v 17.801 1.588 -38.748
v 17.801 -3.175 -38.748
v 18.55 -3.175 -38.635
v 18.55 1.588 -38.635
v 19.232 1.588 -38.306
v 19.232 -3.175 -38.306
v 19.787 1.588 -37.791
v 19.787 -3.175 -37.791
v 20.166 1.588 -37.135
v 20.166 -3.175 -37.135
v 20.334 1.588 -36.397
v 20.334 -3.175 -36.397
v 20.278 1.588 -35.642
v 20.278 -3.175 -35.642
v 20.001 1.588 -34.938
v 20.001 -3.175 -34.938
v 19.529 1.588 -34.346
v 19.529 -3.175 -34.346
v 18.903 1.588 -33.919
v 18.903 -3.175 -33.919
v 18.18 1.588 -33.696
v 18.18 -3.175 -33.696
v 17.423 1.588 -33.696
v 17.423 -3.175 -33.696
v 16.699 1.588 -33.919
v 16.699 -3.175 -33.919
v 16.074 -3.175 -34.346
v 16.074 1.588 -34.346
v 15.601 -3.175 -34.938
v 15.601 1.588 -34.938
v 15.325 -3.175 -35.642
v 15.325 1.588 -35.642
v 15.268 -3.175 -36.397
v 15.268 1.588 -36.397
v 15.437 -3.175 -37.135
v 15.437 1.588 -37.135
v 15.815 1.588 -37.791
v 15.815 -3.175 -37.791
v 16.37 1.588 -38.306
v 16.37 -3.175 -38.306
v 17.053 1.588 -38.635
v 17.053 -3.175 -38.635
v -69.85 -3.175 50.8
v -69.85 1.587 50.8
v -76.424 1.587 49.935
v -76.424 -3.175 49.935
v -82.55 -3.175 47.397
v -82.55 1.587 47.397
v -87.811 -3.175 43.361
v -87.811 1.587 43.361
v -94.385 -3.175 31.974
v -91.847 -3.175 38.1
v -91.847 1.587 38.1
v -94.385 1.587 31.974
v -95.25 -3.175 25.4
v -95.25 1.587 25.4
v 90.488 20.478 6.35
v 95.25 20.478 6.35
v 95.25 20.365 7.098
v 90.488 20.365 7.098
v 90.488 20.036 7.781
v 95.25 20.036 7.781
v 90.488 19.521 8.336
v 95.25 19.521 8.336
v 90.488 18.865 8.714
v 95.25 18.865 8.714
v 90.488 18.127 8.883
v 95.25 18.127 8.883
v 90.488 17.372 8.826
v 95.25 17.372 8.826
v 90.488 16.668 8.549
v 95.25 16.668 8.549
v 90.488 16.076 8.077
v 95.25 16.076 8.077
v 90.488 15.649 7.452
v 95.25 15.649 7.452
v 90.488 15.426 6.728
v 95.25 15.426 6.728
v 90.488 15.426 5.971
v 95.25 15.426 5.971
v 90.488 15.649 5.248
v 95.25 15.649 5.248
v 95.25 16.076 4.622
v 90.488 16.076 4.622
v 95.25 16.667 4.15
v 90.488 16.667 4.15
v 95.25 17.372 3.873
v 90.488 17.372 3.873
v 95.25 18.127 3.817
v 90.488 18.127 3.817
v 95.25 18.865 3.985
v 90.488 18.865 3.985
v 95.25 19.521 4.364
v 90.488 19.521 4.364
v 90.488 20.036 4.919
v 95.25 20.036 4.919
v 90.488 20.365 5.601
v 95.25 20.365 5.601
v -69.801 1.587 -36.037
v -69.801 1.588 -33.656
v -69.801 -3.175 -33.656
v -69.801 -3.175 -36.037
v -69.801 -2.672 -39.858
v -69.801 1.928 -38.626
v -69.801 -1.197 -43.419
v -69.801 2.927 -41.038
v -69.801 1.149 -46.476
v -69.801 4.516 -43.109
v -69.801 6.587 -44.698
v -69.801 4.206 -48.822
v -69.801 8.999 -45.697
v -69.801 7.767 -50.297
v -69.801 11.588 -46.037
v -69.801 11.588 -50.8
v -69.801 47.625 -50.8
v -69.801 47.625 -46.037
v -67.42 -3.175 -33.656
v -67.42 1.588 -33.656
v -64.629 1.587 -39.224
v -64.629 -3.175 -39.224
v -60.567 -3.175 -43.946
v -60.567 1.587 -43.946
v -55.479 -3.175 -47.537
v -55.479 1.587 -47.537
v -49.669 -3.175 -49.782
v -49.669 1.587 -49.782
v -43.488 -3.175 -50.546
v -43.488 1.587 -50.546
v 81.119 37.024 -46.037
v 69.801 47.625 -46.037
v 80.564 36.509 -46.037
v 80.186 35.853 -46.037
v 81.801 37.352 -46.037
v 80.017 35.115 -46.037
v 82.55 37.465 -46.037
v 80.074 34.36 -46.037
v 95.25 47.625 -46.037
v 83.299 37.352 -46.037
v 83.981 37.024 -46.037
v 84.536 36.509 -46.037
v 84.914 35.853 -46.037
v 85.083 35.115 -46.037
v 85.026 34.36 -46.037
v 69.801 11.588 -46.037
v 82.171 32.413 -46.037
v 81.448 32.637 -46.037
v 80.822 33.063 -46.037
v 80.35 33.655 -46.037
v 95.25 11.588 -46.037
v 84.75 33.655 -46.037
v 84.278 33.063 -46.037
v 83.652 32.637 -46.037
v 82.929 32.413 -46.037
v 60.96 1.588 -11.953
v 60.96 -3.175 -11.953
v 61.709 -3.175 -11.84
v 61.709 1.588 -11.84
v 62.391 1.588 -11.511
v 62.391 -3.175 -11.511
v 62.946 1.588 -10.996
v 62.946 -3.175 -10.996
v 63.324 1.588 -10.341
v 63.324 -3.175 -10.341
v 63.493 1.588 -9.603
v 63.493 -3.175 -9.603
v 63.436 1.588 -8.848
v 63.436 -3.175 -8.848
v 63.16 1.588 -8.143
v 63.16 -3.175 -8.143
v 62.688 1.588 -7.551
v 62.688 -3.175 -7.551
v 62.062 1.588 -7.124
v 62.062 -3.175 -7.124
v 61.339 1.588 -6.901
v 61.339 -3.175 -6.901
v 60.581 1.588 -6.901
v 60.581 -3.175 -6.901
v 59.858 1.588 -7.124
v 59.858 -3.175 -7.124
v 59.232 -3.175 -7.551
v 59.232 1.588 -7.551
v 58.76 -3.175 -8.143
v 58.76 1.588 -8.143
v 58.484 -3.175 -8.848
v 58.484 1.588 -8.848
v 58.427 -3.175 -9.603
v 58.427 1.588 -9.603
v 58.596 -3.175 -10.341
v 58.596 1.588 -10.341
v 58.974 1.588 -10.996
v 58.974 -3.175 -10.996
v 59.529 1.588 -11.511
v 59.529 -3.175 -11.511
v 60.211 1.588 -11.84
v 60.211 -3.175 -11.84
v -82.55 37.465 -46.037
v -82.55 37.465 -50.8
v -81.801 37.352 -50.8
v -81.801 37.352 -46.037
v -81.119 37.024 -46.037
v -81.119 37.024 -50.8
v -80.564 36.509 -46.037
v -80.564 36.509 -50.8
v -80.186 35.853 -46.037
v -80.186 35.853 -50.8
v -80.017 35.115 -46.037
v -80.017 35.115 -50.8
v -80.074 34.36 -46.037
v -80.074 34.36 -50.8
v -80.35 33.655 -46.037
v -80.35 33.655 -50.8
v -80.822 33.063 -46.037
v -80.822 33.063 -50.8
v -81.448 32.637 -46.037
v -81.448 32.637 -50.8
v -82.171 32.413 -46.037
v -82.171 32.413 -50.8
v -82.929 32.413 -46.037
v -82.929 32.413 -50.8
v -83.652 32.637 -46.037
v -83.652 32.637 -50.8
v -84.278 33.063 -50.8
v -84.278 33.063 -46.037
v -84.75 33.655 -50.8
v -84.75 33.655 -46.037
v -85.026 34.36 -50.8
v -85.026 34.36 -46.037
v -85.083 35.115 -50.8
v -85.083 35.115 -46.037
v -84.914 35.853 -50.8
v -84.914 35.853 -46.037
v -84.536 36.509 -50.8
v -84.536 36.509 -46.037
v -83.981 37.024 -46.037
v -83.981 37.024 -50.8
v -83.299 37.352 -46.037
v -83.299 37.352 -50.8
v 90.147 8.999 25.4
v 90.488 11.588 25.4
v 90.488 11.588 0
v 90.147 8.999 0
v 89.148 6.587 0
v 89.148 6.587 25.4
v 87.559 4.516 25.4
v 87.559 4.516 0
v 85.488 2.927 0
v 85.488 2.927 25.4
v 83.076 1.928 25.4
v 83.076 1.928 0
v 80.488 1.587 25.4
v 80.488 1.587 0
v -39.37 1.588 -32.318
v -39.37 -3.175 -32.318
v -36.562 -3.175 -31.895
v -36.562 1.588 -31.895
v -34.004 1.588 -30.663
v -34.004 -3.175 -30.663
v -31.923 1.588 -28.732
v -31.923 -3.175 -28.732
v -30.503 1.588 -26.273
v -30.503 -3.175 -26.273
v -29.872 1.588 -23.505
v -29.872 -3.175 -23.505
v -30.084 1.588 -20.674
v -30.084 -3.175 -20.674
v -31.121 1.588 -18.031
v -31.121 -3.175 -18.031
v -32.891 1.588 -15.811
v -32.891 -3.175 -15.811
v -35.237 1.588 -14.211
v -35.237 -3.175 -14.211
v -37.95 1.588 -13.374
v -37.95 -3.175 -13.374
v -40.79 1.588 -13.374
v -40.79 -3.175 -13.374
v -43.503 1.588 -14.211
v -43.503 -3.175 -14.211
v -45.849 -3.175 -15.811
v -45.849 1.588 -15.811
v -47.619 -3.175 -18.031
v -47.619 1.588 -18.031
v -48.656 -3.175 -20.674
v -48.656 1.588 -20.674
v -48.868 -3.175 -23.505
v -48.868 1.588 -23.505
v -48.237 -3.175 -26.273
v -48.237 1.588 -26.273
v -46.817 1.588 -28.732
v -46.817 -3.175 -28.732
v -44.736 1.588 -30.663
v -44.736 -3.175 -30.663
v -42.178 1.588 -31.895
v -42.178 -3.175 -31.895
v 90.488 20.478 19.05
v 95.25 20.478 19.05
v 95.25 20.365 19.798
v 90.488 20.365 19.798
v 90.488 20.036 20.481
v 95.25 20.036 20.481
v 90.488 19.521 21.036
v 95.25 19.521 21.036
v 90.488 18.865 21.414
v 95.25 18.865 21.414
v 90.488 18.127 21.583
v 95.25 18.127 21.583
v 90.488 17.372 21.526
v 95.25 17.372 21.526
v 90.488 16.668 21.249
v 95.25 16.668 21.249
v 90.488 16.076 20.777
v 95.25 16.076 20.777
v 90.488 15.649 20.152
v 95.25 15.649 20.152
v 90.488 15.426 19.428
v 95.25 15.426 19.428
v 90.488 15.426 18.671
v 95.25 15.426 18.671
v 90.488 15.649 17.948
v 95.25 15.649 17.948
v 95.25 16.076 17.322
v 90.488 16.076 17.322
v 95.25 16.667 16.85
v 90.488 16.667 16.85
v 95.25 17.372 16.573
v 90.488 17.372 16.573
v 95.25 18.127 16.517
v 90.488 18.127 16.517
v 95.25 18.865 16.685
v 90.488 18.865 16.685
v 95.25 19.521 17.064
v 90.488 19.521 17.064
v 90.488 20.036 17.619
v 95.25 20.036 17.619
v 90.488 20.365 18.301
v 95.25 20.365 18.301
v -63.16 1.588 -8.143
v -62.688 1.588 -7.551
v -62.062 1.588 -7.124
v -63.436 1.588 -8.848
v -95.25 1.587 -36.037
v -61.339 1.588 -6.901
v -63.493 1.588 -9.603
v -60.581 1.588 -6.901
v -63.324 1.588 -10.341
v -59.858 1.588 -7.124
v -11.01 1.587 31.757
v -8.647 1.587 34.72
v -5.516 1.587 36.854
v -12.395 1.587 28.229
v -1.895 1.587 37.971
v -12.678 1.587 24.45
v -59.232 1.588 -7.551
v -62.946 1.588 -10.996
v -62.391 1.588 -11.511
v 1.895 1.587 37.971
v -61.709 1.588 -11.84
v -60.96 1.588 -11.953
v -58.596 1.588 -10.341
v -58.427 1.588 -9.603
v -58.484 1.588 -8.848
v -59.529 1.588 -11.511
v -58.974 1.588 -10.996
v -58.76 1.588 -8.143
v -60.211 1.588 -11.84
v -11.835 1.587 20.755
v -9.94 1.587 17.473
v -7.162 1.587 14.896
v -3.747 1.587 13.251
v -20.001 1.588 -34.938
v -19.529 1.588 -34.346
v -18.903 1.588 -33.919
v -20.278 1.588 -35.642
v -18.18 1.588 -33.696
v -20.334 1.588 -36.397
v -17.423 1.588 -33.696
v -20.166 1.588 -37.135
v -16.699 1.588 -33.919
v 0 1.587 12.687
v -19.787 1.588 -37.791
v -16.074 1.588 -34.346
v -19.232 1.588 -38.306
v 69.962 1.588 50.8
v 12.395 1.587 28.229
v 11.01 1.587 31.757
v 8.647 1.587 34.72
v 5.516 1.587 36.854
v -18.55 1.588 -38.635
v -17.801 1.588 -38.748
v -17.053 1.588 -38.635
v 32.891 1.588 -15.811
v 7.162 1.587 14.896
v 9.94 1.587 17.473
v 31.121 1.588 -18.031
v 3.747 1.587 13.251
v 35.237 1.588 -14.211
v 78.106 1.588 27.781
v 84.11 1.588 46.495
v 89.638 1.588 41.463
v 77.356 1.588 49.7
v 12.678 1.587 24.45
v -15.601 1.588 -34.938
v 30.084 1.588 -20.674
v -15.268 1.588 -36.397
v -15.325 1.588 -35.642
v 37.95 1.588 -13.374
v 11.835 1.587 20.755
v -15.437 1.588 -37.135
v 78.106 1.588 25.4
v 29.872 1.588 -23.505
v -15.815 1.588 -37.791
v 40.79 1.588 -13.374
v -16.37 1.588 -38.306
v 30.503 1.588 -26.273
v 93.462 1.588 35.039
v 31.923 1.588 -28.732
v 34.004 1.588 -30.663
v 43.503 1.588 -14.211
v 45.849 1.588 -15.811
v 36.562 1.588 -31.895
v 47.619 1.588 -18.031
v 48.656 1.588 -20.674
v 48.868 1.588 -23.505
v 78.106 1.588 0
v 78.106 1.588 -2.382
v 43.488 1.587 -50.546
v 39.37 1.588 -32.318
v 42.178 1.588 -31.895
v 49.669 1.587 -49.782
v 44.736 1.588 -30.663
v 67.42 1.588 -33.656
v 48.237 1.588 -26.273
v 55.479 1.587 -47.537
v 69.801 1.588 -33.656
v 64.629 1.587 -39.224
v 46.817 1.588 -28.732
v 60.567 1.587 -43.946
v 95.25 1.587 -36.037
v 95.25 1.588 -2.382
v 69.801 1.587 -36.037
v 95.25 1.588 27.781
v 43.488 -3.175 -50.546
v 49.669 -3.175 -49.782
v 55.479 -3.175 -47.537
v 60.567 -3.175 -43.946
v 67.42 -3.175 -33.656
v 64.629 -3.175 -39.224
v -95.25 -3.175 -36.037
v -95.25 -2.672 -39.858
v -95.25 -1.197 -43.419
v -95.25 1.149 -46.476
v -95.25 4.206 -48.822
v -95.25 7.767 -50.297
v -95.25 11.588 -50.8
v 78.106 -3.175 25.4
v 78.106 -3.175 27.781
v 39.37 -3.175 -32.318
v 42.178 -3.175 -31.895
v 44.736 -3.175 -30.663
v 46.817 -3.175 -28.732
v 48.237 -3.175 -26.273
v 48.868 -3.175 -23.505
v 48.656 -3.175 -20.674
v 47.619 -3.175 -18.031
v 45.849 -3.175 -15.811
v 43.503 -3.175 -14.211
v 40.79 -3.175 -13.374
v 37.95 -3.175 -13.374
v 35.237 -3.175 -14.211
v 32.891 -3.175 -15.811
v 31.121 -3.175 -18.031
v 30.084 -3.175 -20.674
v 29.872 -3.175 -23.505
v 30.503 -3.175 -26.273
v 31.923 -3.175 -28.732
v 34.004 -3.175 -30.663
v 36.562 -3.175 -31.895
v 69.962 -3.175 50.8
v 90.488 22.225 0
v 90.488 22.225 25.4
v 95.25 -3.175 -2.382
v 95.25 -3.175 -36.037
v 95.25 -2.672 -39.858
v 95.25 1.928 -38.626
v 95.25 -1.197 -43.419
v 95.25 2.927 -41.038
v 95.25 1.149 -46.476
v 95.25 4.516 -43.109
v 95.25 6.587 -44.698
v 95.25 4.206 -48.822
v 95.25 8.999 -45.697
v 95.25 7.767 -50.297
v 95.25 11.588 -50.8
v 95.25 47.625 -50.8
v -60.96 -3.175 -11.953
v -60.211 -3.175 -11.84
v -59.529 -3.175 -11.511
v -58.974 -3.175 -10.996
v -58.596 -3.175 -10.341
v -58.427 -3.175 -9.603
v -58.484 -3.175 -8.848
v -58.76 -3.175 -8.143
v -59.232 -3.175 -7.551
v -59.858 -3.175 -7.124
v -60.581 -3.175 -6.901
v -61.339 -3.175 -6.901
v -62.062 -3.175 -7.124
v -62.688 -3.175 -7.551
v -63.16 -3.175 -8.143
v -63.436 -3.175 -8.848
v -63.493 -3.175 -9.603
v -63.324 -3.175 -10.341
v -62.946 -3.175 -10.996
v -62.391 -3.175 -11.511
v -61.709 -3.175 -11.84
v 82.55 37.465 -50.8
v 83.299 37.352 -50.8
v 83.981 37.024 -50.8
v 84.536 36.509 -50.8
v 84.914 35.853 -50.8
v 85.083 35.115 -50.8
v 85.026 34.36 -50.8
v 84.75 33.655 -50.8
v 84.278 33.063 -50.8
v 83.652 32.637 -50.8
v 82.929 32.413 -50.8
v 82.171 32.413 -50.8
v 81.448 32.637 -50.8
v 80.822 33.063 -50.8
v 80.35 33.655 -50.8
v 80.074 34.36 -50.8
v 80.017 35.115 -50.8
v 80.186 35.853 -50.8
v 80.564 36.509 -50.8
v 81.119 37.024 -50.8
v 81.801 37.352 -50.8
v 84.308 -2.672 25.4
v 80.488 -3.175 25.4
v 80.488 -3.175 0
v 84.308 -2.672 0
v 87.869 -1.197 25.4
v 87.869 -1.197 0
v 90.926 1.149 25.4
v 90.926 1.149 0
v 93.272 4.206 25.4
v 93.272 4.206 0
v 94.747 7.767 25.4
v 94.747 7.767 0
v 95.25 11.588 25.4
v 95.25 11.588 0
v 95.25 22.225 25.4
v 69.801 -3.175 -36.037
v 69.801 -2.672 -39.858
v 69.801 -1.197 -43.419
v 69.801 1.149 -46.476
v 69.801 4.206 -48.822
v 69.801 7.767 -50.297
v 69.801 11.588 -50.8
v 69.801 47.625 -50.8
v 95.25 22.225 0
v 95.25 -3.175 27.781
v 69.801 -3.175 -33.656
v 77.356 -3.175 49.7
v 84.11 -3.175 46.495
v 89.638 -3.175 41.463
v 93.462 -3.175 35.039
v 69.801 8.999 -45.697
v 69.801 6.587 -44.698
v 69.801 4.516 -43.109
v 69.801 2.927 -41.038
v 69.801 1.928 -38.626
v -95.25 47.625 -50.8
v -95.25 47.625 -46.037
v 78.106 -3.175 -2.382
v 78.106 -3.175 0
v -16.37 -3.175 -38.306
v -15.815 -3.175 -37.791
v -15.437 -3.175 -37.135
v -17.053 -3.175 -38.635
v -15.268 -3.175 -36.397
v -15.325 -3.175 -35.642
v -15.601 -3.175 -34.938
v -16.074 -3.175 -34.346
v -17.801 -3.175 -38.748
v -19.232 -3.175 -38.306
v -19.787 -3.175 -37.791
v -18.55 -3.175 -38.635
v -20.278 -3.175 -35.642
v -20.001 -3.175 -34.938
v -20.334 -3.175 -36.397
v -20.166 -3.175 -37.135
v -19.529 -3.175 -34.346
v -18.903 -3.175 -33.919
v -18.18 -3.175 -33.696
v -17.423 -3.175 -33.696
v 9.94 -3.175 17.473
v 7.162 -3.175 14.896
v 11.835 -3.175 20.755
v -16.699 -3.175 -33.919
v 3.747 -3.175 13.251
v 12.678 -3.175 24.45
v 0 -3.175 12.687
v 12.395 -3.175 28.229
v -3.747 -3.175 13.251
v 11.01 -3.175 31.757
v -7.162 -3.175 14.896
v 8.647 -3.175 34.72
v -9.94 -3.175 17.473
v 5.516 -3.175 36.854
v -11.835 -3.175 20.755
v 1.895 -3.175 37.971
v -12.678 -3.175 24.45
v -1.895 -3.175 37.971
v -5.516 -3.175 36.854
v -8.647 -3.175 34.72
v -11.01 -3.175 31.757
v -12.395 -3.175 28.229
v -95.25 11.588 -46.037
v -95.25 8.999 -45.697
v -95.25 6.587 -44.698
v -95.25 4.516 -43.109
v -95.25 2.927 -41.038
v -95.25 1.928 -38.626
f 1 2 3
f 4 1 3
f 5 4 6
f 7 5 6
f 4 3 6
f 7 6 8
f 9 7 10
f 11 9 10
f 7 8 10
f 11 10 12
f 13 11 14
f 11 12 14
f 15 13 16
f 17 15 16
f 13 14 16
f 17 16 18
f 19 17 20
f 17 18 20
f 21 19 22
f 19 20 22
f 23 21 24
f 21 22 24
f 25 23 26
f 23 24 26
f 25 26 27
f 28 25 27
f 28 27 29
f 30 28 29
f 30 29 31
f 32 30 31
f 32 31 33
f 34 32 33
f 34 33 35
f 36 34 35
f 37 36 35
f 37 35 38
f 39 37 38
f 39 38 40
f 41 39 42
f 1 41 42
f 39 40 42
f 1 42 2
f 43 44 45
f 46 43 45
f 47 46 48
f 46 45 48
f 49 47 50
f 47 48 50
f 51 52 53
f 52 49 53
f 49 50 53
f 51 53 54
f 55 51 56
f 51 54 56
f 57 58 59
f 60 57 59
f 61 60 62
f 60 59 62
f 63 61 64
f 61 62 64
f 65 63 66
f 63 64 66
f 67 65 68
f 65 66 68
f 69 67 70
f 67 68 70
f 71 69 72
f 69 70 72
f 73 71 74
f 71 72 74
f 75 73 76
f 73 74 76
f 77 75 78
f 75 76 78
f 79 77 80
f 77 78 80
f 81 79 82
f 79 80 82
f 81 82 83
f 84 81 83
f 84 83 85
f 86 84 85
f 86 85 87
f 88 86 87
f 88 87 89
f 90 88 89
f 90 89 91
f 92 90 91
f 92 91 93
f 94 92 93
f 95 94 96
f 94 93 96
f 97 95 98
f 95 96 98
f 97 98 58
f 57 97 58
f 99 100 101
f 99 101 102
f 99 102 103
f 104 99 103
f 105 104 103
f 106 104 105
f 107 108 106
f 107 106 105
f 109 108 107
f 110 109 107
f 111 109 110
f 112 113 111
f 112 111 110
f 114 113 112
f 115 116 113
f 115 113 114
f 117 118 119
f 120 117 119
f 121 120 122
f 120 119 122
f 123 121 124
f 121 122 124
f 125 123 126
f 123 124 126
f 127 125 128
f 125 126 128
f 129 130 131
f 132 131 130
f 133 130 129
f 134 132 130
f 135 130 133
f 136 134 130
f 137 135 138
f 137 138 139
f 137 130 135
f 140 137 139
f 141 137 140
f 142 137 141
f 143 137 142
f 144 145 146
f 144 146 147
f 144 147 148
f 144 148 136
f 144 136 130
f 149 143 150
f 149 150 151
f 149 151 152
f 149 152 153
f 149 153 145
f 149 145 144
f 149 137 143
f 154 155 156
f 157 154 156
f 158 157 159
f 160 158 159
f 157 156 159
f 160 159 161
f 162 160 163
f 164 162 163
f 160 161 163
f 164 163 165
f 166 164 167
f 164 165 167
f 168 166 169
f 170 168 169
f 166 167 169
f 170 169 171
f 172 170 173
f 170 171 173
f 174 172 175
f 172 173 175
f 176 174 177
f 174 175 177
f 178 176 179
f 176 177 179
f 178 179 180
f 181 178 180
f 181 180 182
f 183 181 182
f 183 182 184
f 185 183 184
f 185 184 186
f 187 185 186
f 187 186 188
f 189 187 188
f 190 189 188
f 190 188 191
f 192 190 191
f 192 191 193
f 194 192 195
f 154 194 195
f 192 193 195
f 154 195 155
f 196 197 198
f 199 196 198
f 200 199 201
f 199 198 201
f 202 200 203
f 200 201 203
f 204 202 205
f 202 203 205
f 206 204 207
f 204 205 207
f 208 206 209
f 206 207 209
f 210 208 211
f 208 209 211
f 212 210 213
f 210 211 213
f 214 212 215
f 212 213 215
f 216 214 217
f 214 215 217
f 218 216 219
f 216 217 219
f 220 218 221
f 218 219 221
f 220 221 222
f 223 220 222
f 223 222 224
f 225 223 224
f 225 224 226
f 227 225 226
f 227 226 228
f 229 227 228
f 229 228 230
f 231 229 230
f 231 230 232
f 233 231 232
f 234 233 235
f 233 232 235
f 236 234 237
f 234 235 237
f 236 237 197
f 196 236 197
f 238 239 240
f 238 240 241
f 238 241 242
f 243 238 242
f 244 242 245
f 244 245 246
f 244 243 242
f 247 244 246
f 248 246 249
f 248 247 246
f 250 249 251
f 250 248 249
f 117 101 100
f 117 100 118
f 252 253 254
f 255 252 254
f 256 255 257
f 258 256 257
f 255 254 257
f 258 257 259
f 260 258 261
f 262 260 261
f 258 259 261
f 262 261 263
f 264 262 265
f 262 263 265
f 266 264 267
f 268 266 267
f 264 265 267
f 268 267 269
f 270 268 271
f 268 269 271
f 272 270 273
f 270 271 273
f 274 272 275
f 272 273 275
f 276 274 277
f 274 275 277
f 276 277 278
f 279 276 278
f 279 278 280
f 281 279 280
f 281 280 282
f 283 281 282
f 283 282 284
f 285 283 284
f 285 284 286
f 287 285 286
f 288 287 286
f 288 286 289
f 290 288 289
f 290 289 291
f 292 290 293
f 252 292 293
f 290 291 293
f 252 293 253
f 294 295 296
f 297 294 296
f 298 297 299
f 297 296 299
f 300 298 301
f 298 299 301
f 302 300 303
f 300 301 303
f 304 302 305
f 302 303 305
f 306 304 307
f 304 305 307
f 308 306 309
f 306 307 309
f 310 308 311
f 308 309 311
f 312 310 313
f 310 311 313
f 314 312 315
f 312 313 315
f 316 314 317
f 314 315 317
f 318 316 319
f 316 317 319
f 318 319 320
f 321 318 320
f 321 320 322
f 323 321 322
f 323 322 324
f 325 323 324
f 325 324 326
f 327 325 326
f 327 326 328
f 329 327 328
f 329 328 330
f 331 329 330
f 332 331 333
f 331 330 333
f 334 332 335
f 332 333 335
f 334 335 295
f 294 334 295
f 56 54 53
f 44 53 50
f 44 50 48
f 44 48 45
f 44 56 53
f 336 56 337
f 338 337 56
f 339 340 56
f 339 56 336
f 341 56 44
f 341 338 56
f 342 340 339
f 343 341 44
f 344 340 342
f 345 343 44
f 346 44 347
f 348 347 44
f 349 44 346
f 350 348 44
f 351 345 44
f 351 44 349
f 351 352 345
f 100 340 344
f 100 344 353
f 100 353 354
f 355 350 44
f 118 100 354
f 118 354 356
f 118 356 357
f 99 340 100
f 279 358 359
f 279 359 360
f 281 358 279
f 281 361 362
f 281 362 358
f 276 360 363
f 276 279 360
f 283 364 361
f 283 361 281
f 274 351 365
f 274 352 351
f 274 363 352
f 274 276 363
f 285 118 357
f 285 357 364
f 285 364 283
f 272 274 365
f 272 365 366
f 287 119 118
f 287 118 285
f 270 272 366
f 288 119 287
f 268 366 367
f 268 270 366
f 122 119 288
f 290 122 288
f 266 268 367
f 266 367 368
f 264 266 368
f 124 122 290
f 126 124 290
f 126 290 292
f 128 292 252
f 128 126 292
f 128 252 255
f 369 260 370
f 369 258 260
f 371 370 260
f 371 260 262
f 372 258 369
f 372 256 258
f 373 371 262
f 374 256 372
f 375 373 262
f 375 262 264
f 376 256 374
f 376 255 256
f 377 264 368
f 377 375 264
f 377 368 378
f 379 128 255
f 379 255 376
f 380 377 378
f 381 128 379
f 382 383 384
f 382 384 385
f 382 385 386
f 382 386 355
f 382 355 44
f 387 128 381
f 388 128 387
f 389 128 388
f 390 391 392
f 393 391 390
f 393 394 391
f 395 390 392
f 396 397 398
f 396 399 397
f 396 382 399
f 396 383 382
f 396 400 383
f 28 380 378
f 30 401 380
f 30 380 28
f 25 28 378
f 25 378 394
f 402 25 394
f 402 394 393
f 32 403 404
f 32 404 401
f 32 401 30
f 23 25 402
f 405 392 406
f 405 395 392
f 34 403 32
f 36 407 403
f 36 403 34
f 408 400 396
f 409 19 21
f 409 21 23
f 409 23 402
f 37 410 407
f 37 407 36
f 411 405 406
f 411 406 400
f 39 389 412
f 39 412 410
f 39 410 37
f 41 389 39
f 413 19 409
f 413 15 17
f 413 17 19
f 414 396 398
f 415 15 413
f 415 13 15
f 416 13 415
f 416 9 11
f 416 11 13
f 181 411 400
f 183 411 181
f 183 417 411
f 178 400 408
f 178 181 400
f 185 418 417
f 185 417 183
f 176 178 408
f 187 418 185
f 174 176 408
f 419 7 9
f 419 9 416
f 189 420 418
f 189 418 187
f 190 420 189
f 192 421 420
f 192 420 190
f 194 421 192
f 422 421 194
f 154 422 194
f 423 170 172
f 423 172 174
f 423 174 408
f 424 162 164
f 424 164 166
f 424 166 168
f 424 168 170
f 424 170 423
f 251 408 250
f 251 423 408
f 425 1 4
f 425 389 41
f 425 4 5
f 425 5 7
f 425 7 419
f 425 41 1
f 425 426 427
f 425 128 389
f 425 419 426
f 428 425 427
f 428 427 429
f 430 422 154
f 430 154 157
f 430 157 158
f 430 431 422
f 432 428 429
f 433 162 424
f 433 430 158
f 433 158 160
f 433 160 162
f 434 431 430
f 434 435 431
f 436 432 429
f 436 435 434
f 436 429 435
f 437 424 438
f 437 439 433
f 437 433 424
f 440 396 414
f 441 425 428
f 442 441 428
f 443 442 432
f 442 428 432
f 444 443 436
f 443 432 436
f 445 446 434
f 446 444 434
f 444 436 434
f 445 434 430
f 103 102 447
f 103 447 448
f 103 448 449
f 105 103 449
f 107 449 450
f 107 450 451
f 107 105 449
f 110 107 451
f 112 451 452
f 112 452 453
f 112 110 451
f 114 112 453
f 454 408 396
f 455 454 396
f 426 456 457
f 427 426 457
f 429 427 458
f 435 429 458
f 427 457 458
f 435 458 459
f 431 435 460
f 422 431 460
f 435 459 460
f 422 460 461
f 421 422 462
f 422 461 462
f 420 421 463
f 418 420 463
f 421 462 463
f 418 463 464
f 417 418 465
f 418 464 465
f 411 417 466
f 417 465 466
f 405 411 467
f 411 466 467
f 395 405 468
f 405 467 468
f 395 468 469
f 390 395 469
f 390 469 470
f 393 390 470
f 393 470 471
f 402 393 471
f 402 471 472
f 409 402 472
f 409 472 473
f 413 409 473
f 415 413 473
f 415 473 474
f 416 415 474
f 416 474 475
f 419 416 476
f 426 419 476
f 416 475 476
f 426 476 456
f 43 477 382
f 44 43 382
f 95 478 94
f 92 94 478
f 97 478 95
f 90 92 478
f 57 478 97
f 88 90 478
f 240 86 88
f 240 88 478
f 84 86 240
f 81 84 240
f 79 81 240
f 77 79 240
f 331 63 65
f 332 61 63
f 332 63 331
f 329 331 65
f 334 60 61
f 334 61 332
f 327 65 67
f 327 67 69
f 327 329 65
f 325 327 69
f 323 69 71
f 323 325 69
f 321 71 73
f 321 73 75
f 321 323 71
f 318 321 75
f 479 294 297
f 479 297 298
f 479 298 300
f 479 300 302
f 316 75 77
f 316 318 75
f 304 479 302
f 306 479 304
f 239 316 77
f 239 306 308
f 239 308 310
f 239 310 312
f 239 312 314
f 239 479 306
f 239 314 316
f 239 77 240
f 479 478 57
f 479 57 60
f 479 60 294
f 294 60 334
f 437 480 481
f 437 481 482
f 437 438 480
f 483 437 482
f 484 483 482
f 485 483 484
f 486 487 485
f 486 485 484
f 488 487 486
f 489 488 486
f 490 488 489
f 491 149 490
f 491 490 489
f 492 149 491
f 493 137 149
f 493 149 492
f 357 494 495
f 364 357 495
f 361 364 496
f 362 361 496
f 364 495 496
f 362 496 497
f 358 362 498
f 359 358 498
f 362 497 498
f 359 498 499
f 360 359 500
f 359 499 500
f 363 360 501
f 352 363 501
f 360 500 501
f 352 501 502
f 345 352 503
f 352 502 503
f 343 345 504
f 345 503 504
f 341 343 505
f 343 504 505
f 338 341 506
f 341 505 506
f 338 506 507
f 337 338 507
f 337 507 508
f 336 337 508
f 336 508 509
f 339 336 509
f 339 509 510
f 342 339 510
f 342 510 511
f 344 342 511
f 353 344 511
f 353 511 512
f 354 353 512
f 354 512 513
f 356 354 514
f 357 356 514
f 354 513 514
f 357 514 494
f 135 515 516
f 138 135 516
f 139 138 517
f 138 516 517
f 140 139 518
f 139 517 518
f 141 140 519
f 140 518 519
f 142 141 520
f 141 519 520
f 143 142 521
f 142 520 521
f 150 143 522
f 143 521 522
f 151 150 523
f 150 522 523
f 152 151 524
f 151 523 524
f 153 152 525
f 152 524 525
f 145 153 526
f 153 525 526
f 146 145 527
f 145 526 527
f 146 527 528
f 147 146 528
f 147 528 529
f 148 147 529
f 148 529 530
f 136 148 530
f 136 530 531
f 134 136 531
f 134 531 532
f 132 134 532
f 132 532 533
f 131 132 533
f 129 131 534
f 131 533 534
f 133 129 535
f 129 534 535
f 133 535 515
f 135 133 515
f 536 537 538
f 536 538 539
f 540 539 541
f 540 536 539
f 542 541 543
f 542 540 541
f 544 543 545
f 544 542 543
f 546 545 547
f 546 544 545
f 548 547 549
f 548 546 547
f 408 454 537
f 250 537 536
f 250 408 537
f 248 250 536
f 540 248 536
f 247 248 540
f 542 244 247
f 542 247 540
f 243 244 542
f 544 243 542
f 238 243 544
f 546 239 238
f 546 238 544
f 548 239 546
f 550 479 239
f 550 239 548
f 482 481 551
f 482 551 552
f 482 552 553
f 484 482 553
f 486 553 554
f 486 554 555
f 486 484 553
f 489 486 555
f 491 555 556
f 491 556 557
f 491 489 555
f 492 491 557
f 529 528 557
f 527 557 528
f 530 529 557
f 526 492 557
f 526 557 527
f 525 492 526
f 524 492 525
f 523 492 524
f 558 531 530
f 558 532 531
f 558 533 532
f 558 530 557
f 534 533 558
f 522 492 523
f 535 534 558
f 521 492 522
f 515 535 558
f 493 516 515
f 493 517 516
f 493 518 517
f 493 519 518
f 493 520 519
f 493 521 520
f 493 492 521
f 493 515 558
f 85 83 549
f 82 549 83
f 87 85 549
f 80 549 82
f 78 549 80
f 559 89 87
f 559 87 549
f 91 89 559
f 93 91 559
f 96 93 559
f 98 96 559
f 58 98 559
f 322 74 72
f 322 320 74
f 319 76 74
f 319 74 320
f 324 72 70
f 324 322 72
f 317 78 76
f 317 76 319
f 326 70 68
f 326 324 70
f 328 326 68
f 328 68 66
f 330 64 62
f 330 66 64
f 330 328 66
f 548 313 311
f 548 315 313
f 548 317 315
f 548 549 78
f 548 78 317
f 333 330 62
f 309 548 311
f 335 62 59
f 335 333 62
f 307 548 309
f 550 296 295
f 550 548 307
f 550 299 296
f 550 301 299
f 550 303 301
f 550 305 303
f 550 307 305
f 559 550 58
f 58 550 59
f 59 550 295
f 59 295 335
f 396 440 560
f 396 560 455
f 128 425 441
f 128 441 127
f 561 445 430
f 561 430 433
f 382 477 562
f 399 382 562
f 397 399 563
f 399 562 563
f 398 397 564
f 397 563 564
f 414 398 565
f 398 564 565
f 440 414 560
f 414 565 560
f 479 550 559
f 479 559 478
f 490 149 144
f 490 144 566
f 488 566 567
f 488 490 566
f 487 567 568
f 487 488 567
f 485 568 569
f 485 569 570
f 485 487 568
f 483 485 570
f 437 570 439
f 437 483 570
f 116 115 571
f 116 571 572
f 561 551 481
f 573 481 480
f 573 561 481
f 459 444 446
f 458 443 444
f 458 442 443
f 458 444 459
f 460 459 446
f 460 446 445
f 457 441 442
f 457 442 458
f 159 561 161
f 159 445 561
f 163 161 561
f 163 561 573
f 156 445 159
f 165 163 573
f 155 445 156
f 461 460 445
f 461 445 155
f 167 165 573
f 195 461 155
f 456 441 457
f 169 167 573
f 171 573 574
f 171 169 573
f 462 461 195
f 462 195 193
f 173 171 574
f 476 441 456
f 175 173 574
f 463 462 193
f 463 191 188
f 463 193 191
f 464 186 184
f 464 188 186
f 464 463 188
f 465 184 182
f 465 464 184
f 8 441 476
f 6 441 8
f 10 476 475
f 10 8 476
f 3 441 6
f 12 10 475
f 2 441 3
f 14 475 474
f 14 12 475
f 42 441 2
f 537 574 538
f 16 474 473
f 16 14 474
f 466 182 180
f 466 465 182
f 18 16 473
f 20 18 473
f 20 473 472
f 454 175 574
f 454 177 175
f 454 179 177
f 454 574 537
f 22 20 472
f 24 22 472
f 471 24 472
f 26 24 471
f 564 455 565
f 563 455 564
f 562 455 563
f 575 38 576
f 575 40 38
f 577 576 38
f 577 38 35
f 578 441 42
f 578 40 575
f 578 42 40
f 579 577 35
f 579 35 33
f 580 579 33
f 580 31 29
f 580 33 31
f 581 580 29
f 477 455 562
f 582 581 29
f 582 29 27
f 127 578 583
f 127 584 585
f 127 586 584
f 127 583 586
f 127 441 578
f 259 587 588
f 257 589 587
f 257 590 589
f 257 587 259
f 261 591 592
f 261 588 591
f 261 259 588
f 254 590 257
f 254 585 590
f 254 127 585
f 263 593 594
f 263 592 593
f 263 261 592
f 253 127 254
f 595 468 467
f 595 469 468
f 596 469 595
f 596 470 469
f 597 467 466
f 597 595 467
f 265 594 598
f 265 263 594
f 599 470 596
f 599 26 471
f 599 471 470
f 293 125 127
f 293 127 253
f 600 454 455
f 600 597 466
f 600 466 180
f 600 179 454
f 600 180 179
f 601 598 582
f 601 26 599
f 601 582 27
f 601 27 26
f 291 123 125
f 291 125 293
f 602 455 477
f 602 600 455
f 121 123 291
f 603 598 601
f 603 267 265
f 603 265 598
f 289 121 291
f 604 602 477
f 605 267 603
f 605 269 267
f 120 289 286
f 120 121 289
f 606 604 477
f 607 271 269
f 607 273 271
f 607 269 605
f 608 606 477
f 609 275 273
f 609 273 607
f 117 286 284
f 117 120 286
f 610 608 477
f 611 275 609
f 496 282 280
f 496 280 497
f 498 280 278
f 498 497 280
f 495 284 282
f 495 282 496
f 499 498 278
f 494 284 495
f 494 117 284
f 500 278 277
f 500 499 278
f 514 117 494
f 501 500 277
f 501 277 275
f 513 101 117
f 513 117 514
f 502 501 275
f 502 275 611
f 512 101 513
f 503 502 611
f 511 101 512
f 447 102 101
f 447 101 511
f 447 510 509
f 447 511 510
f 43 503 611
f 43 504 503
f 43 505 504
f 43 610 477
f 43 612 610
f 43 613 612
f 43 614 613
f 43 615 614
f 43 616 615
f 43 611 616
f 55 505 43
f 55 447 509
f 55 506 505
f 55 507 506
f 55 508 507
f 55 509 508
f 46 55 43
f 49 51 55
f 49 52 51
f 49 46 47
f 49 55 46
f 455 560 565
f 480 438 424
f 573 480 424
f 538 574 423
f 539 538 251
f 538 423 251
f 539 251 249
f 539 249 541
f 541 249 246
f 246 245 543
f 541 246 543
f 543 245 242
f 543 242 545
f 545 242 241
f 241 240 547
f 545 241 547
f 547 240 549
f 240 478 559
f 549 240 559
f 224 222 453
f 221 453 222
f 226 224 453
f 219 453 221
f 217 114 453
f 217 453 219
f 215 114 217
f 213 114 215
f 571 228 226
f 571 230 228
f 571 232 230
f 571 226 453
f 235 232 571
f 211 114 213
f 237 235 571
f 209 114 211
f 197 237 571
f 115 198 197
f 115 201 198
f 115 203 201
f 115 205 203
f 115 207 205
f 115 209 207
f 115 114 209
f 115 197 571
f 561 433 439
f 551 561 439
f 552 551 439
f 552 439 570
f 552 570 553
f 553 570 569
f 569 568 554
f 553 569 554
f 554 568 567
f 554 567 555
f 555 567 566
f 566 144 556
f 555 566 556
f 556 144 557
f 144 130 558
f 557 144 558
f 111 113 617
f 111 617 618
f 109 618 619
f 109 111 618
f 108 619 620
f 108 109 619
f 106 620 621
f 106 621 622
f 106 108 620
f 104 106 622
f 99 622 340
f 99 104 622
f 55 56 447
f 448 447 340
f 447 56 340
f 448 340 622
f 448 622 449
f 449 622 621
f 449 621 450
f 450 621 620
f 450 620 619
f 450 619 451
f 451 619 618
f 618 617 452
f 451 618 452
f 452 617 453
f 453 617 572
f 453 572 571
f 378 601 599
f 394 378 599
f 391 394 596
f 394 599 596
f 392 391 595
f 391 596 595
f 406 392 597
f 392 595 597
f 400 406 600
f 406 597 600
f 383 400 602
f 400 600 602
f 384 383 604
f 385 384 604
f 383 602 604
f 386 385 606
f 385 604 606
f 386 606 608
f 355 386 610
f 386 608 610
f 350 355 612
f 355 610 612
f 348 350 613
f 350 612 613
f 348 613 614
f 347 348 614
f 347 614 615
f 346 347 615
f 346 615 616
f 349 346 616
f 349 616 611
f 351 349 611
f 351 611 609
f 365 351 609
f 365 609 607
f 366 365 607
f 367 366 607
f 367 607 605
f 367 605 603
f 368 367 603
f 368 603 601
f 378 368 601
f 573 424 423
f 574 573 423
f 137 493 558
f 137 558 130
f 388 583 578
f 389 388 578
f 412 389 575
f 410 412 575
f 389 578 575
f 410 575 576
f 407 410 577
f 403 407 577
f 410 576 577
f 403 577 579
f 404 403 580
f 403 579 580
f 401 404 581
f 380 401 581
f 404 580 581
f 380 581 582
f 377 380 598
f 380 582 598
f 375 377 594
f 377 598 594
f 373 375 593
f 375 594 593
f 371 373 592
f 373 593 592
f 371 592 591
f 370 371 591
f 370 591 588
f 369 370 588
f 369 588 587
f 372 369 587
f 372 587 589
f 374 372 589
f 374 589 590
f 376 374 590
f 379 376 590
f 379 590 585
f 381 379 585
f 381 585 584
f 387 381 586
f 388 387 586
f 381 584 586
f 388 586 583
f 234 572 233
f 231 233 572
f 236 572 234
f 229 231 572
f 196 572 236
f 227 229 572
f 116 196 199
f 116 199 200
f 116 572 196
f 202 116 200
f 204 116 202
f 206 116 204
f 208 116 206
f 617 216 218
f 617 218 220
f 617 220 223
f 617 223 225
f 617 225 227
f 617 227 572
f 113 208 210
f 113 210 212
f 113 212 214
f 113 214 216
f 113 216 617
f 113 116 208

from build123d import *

# Parameters (mm, degrees)
SKETCH1_W                     = 190.5
SKETCH1_H                     = 101.6
BOSS_EXTRUDE1_DEPTH           = 1.5875
CONVERT_SOLID1_START          = -95.25
CONVERT_SOLID1_OUTLINE_W      = 3.175
CONVERT_SOLID1_OUTLINE_H      = 101.6
CONVERT_SOLID1_DEPTH          = 190.5
SKETCH35_W                    = 139.601875342
SKETCH35_H                    = 6.35
CUT_EXTRUDE7_DEPTH            = 0.254
EDGE_FLANGE1_STRIP_W          = 39.05
EDGE_FLANGE1_STRIP_H          = 4.7625
EDGE_FLANGE1_STRIP_CUT_DEPTH  = 25.449062329
EDGE_FLANGE1_RELIEF_W         = 41.43125
EDGE_FLANGE1_RELIEF_H         = 2.38125
EDGE_FLANGE1_RELIEF_CUT_DEPTH = 4.7625
EDGE_FLANGE1_DEPTH            = 25.449062329
EDGE_FLANGE2_STRIP_W          = 39.05
EDGE_FLANGE2_STRIP_H          = 4.7625
EDGE_FLANGE2_STRIP_CUT_DEPTH  = 25.449062329
EDGE_FLANGE2_RELIEF_W         = 41.43125
EDGE_FLANGE2_RELIEF_H         = 2.38125
EDGE_FLANGE2_RELIEF_CUT_DEPTH = 4.7625
EDGE_FLANGE2_DEPTH            = 25.449062329
SKETCH50_R                    = 12.713493351
CUT_EXTRUDE9_DEPTH            = 5.08
FILLET1_R                     = 25.4
CUT_EXTRUDE11_START           = -4.7625
CUT_EXTRUDE11_OUTLINE_W       = 6.35
CUT_EXTRUDE11_OUTLINE_H       = 0.00254
CUT_EXTRUDE11_OUTLINE_H_2     = 0.000254
CUT_EXTRUDE11_DEPTH           = 4.7625
EDGE_FLANGE3_STRIP_W          = 39.05
EDGE_FLANGE3_STRIP_H          = 4.7625
EDGE_FLANGE3_STRIP_CUT_DEPTH  = 25.4
EDGE_FLANGE3_RELIEF_W         = 41.43125
EDGE_FLANGE3_RELIEF_H         = 2.38125
EDGE_FLANGE3_RELIEF_CUT_DEPTH = 4.7625
EDGE_FLANGE3_DEPTH            = 25.4
SKETCH55_R                    = 2.54
CUT_EXTRUDE12_DEPTH           = 4.7625
FILLET2_R                     = 25.4
SKETCH56_R                    = 2.54
CUT_EXTRUDE13_DEPTH           = 4.7625
SKETCH57_R                    = 9.525
SKETCH57_R_2                  = 2.54
CUT_EXTRUDE14_DEPTH           = 4.7625


# Read off the part's stored shape, not the designer's step: Convert-Solid1, Cut-Extrude11
# Sheet-metal steps are written as plain solids
with BuildPart() as part:
    # Sketch1 → Boss-Extrude1 (new body)
    with BuildSketch(Plane(origin=(0, 0, 0), x_dir=(1, 0, 0), z_dir=(0, 1, 0))):
        Rectangle(SKETCH1_W, SKETCH1_H)
    extrude(amount=BOSS_EXTRUDE1_DEPTH)

    # Convert-Solid1 outline → Convert-Solid1 (add)
    with BuildSketch(Plane.YZ.offset(CONVERT_SOLID1_START)):
        with Locations((-1.5875, 0)):
            Rectangle(CONVERT_SOLID1_OUTLINE_W, CONVERT_SOLID1_OUTLINE_H)
    extrude(amount=CONVERT_SOLID1_DEPTH)

    # Sketch35 → Cut-Extrude7 (cut)
    with BuildSketch(Plane(origin=(0, 0, -50.8), x_dir=(-1, 0, 0), z_dir=(0, 0, -1))):
        Rectangle(SKETCH35_W, SKETCH35_H)
    extrude(amount=-CUT_EXTRUDE7_DEPTH, mode=Mode.SUBTRACT)

    # Edge-Flange1 strip (across the edge) → Edge-Flange1 strip cut (cut)
    with BuildSketch(Plane(origin=(95.25, 1.5875, -50.8), x_dir=(0, 0, 1), z_dir=(-1, 0, 0))):
        with Locations((-4.7625, -2.38125)):
            Rectangle(EDGE_FLANGE1_STRIP_W, EDGE_FLANGE1_STRIP_H)
    extrude(amount=EDGE_FLANGE1_STRIP_CUT_DEPTH, mode=Mode.SUBTRACT)

    # Edge-Flange1 relief (on the sheet) → Edge-Flange1 relief cut (cut)
    with BuildSketch(Plane(origin=(95.25, 1.5875, -36.0375), x_dir=(0, 0, 1), z_dir=(0, 1, 0))):
        with Locations((-18.334375, -26.639687329)):
            Rectangle(EDGE_FLANGE1_RELIEF_W, EDGE_FLANGE1_RELIEF_H)
    extrude(amount=-EDGE_FLANGE1_RELIEF_CUT_DEPTH, mode=Mode.SUBTRACT)

    # Edge-Flange1 section (across the edge) → Edge-Flange1 (add)
    with BuildSketch(Plane(origin=(95.25, 1.5875, -50.8), x_dir=(0, 0, 1), z_dir=(-1, 0, 0))):
        with BuildLine():
            Line((0, 10), (0, 46.0375))
            Line((0, 46.0375), (4.7625, 46.0375))
            Line((4.7625, 46.0375), (4.7625, 10))
            ThreePointArc((4.7625, 10), (7.691432188, 2.928932188), (14.7625, 0))
            Line((14.7625, 0), (14.7625, -4.7625))
            ThreePointArc((14.7625, -4.7625), (4.323836143, -0.438663857), (0, 10))
        make_face()
    extrude(amount=EDGE_FLANGE1_DEPTH)

    # Edge-Flange2 strip (across the edge) → Edge-Flange2 strip cut (cut)
    with BuildSketch(Plane(origin=(-69.800937671, 1.5875, -50.8), x_dir=(0, 0, 1), z_dir=(-1, 0, 0))):
        with Locations((-4.7625, -2.38125)):
            Rectangle(EDGE_FLANGE2_STRIP_W, EDGE_FLANGE2_STRIP_H)
    extrude(amount=EDGE_FLANGE2_STRIP_CUT_DEPTH, mode=Mode.SUBTRACT)

    # Edge-Flange2 relief (on the sheet) → Edge-Flange2 relief cut (cut)
    with BuildSketch(Plane(origin=(-69.800937671, 1.5875, -36.0375), x_dir=(0, 0, 1), z_dir=(0, 1, 0))):
        with Locations((-18.334375, 1.190625)):
            Rectangle(EDGE_FLANGE2_RELIEF_W, EDGE_FLANGE2_RELIEF_H)
    extrude(amount=-EDGE_FLANGE2_RELIEF_CUT_DEPTH, mode=Mode.SUBTRACT)

    # Edge-Flange2 section (across the edge) → Edge-Flange2 (add)
    with BuildSketch(Plane(origin=(-69.800937671, 1.5875, -50.8), x_dir=(0, 0, 1), z_dir=(-1, 0, 0))):
        with BuildLine():
            Line((0, 10), (0, 46.0375))
            Line((0, 46.0375), (4.7625, 46.0375))
            Line((4.7625, 46.0375), (4.7625, 10))
            ThreePointArc((4.7625, 10), (7.691432188, 2.928932188), (14.7625, 0))
            Line((14.7625, 0), (14.7625, -4.7625))
            ThreePointArc((14.7625, -4.7625), (4.323836143, -0.438663857), (0, 10))
        make_face()
    extrude(amount=EDGE_FLANGE2_DEPTH)

    # Sketch50 → Cut-Extrude9 (cut)
    with BuildSketch(Plane(origin=(0, -3.175, 0), x_dir=(-1, 0, 0), z_dir=(0, -1, 0))):
        with Locations(Location((0, -25.4, 0), (0, 0, 90))):
            Circle(SKETCH50_R)
    extrude(amount=-CUT_EXTRUDE9_DEPTH, mode=Mode.SUBTRACT)

    # Fillet1
    # the kernel refuses this fillet: 25.4 mm, written as the material it takes off along each edge
    with BuildSketch(Plane(origin=(-67.419687671, 61.417239936, -50.546), x_dir=(1, 0, 0), z_dir=(0, -1, 0))) as fillet1_piece_1:
        with BuildLine():
            CenterArc((23.931895975, 25.4), FILLET1_R, 199.575530564, 70.424469436)
            Line((0, 16.88975), (-0.478637919, 16.719545))
            ThreePointArc((-0.478637919, 16.719545), (-0.508, 8.444875), (-0.508, 0))
            Line((-0.508, 0), (0, -0.508))
            Line((0, -0.508), (23.931895975, -0.508))
            Line((23.931895975, -0.508), (23.931895975, 0))
        make_face()
    extrude(amount=124.421979873, mode=Mode.SUBTRACT)
    with BuildSketch(Plane(origin=(67.419687671, 61.417239936, -50.546), x_dir=(0, 0, 1), z_dir=(0, -1, 0))) as fillet1_piece_2:
        with BuildLine():
            CenterArc((25.4, 23.931895975), FILLET1_R, 180, 70.424469436)
            Line((0, 23.931895975), (-0.508, 23.931895975))
            Line((-0.508, 23.931895975), (-0.508, 0))
            Line((-0.508, 0), (0, -0.508))
            ThreePointArc((0, -0.508), (8.444875, -0.508), (16.719545, -0.478637919))
            Line((16.719545, -0.478637919), (16.88975, 0))
        make_face()
    extrude(amount=124.421979873, mode=Mode.SUBTRACT)

    # Cut-Extrude11 outline → Cut-Extrude11 (cut)
    with BuildSketch(Plane.XZ.offset(3.175).offset(CUT_EXTRUDE11_START)):
        with Locations((92.075, -0.001524)):
            Rectangle(CUT_EXTRUDE11_OUTLINE_W, CUT_EXTRUDE11_OUTLINE_H)
        with Locations((92.075, 25.399873)):
            Rectangle(CUT_EXTRUDE11_OUTLINE_W, CUT_EXTRUDE11_OUTLINE_H_2)
    extrude(amount=CUT_EXTRUDE11_DEPTH, mode=Mode.SUBTRACT)

    # Edge-Flange3 strip (across the edge) → Edge-Flange3 strip cut (cut)
    with BuildSketch(Plane(origin=(95.25, 1.5875, 25.399746), x_dir=(-1, 0, 0), z_dir=(0, 0, -1))):
        with Locations((-4.7625, -2.38125)):
            Rectangle(EDGE_FLANGE3_STRIP_W, EDGE_FLANGE3_STRIP_H)
    extrude(amount=EDGE_FLANGE3_STRIP_CUT_DEPTH, mode=Mode.SUBTRACT)

    # Edge-Flange3 relief (on the sheet) → Edge-Flange3 relief cut (cut)
    with BuildSketch(Plane(origin=(80.4875, 1.5875, 25.399746), x_dir=(-1, 0, 0), z_dir=(0, 1, 0))):
        with Locations((-18.334375, 1.190625)):
            Rectangle(EDGE_FLANGE3_RELIEF_W, EDGE_FLANGE3_RELIEF_H)
        with Locations((-18.334375, -26.590625)):
            Rectangle(EDGE_FLANGE3_RELIEF_W, EDGE_FLANGE3_RELIEF_H)
    extrude(amount=-EDGE_FLANGE3_RELIEF_CUT_DEPTH, mode=Mode.SUBTRACT)

    # Edge-Flange3 section (across the edge) → Edge-Flange3 (add)
    with BuildSketch(Plane(origin=(95.25, 1.5875, 25.399746), x_dir=(-1, 0, 0), z_dir=(0, 0, -1))):
        with BuildLine():
            Line((0, 10), (0, 20.6375))
            Line((0, 20.6375), (4.7625, 20.6375))
            Line((4.7625, 20.6375), (4.7625, 10))
            ThreePointArc((4.7625, 10), (7.691432188, 2.928932188), (14.7625, 0))
            Line((14.7625, 0), (14.7625, -4.7625))
            ThreePointArc((14.7625, -4.7625), (4.323836143, -0.438663857), (0, 10))
        make_face()
    extrude(amount=EDGE_FLANGE3_DEPTH)

    # Sketch55 → Cut-Extrude12 (cut)
    with BuildSketch(Plane(origin=(95.25, 0, 0), x_dir=(0, 0, -1), z_dir=(1, 0, 0))):
        with Locations(Location((-6.349746, 17.9375, 0), (0, 0, 90))):
            Circle(SKETCH55_R)
        with Locations(Location((-19.049746, 17.9375, 0), (0, 0, 90))):
            Circle(SKETCH55_R)
    extrude(amount=-CUT_EXTRUDE12_DEPTH, mode=Mode.SUBTRACT)

    # Fillet2
    # the kernel refuses this fillet: 25.4 mm, written as the material it takes off along each edge
    with BuildSketch(Plane(origin=(-95.25, 65.0875, 50.8), x_dir=(1, 0, 0), z_dir=(0, -1, 0))) as fillet2_piece_1:
        with BuildLine():
            CenterArc((FILLET2_R, -FILLET2_R), FILLET2_R, 90, 90)
            Line((0, -FILLET2_R), (-FILLET2_R * 0.02, -FILLET2_R))
            Line((-FILLET2_R * 0.02, -FILLET2_R), (-FILLET2_R * 0.02, FILLET2_R * 0.02))
            Line((-FILLET2_R * 0.02, FILLET2_R * 0.02), (FILLET2_R, FILLET2_R * 0.02))
            Line((FILLET2_R, FILLET2_R * 0.02), (FILLET2_R, 0))
        make_face()
    extrude(amount=131.7625, mode=Mode.SUBTRACT)
    with BuildSketch(Plane(origin=(95.25, -66.395391195, 50.8), x_dir=(-1, 0, 0), z_dir=(0, 1, 0))) as fillet2_piece_2:
        with BuildLine():
            CenterArc((25.288156478, -25.4), FILLET2_R, 90, 84.621196501)
            Line((0, -23.019004), (-0.50576313, -22.97138408))
            ThreePointArc((-0.50576313, -22.97138408), (-0.508, -11.509502), (-0.508, 0))
            Line((-0.508, 0), (0, 0.508))
            Line((0, 0.508), (25.288156478, 0.508))
            Line((25.288156478, 0.508), (25.288156478, 0))
        make_face()
    extrude(amount=131.203282389, mode=Mode.SUBTRACT)

    # Sketch56 → Cut-Extrude13 (cut)
    with BuildSketch(Plane(origin=(0, 0, -50.8), x_dir=(-1, 0, 0), z_dir=(0, 0, -1))):
        with Locations(Location((-82.55, 34.925, 0), (0, 0, 90))):
            Circle(SKETCH56_R)
        with Locations(Location((82.55, 34.925, 0), (0, 0, 90))):
            Circle(SKETCH56_R)
    extrude(amount=-CUT_EXTRUDE13_DEPTH, mode=Mode.SUBTRACT)

    # Sketch57 → Cut-Extrude14 (cut)
    with BuildSketch(Plane.XZ.offset(3.175)):
        with Locations(Location((39.37, -22.793111541, 0), (0, 0, 270))):
            Circle(SKETCH57_R)
        with Locations(Location((60.96, -9.412831275, 0), (0, 0, 270))):
            Circle(SKETCH57_R_2)
        with Locations(Location((17.801190198, -36.207523333, 0), (0, 0, 270))):
            Circle(SKETCH57_R_2)
        with Locations(Location((-17.801190198, -36.207523333, 0), (0, 0, 270))):
            Circle(SKETCH57_R_2)
        with Locations(Location((-39.37, -22.793111541, 0), (0, 0, 270))):
            Circle(SKETCH57_R)
        with Locations(Location((-60.96, -9.412831275, 0), (0, 0, 270))):
            Circle(SKETCH57_R_2)
    extrude(amount=-CUT_EXTRUDE14_DEPTH, mode=Mode.SUBTRACT)


solid = part.part
